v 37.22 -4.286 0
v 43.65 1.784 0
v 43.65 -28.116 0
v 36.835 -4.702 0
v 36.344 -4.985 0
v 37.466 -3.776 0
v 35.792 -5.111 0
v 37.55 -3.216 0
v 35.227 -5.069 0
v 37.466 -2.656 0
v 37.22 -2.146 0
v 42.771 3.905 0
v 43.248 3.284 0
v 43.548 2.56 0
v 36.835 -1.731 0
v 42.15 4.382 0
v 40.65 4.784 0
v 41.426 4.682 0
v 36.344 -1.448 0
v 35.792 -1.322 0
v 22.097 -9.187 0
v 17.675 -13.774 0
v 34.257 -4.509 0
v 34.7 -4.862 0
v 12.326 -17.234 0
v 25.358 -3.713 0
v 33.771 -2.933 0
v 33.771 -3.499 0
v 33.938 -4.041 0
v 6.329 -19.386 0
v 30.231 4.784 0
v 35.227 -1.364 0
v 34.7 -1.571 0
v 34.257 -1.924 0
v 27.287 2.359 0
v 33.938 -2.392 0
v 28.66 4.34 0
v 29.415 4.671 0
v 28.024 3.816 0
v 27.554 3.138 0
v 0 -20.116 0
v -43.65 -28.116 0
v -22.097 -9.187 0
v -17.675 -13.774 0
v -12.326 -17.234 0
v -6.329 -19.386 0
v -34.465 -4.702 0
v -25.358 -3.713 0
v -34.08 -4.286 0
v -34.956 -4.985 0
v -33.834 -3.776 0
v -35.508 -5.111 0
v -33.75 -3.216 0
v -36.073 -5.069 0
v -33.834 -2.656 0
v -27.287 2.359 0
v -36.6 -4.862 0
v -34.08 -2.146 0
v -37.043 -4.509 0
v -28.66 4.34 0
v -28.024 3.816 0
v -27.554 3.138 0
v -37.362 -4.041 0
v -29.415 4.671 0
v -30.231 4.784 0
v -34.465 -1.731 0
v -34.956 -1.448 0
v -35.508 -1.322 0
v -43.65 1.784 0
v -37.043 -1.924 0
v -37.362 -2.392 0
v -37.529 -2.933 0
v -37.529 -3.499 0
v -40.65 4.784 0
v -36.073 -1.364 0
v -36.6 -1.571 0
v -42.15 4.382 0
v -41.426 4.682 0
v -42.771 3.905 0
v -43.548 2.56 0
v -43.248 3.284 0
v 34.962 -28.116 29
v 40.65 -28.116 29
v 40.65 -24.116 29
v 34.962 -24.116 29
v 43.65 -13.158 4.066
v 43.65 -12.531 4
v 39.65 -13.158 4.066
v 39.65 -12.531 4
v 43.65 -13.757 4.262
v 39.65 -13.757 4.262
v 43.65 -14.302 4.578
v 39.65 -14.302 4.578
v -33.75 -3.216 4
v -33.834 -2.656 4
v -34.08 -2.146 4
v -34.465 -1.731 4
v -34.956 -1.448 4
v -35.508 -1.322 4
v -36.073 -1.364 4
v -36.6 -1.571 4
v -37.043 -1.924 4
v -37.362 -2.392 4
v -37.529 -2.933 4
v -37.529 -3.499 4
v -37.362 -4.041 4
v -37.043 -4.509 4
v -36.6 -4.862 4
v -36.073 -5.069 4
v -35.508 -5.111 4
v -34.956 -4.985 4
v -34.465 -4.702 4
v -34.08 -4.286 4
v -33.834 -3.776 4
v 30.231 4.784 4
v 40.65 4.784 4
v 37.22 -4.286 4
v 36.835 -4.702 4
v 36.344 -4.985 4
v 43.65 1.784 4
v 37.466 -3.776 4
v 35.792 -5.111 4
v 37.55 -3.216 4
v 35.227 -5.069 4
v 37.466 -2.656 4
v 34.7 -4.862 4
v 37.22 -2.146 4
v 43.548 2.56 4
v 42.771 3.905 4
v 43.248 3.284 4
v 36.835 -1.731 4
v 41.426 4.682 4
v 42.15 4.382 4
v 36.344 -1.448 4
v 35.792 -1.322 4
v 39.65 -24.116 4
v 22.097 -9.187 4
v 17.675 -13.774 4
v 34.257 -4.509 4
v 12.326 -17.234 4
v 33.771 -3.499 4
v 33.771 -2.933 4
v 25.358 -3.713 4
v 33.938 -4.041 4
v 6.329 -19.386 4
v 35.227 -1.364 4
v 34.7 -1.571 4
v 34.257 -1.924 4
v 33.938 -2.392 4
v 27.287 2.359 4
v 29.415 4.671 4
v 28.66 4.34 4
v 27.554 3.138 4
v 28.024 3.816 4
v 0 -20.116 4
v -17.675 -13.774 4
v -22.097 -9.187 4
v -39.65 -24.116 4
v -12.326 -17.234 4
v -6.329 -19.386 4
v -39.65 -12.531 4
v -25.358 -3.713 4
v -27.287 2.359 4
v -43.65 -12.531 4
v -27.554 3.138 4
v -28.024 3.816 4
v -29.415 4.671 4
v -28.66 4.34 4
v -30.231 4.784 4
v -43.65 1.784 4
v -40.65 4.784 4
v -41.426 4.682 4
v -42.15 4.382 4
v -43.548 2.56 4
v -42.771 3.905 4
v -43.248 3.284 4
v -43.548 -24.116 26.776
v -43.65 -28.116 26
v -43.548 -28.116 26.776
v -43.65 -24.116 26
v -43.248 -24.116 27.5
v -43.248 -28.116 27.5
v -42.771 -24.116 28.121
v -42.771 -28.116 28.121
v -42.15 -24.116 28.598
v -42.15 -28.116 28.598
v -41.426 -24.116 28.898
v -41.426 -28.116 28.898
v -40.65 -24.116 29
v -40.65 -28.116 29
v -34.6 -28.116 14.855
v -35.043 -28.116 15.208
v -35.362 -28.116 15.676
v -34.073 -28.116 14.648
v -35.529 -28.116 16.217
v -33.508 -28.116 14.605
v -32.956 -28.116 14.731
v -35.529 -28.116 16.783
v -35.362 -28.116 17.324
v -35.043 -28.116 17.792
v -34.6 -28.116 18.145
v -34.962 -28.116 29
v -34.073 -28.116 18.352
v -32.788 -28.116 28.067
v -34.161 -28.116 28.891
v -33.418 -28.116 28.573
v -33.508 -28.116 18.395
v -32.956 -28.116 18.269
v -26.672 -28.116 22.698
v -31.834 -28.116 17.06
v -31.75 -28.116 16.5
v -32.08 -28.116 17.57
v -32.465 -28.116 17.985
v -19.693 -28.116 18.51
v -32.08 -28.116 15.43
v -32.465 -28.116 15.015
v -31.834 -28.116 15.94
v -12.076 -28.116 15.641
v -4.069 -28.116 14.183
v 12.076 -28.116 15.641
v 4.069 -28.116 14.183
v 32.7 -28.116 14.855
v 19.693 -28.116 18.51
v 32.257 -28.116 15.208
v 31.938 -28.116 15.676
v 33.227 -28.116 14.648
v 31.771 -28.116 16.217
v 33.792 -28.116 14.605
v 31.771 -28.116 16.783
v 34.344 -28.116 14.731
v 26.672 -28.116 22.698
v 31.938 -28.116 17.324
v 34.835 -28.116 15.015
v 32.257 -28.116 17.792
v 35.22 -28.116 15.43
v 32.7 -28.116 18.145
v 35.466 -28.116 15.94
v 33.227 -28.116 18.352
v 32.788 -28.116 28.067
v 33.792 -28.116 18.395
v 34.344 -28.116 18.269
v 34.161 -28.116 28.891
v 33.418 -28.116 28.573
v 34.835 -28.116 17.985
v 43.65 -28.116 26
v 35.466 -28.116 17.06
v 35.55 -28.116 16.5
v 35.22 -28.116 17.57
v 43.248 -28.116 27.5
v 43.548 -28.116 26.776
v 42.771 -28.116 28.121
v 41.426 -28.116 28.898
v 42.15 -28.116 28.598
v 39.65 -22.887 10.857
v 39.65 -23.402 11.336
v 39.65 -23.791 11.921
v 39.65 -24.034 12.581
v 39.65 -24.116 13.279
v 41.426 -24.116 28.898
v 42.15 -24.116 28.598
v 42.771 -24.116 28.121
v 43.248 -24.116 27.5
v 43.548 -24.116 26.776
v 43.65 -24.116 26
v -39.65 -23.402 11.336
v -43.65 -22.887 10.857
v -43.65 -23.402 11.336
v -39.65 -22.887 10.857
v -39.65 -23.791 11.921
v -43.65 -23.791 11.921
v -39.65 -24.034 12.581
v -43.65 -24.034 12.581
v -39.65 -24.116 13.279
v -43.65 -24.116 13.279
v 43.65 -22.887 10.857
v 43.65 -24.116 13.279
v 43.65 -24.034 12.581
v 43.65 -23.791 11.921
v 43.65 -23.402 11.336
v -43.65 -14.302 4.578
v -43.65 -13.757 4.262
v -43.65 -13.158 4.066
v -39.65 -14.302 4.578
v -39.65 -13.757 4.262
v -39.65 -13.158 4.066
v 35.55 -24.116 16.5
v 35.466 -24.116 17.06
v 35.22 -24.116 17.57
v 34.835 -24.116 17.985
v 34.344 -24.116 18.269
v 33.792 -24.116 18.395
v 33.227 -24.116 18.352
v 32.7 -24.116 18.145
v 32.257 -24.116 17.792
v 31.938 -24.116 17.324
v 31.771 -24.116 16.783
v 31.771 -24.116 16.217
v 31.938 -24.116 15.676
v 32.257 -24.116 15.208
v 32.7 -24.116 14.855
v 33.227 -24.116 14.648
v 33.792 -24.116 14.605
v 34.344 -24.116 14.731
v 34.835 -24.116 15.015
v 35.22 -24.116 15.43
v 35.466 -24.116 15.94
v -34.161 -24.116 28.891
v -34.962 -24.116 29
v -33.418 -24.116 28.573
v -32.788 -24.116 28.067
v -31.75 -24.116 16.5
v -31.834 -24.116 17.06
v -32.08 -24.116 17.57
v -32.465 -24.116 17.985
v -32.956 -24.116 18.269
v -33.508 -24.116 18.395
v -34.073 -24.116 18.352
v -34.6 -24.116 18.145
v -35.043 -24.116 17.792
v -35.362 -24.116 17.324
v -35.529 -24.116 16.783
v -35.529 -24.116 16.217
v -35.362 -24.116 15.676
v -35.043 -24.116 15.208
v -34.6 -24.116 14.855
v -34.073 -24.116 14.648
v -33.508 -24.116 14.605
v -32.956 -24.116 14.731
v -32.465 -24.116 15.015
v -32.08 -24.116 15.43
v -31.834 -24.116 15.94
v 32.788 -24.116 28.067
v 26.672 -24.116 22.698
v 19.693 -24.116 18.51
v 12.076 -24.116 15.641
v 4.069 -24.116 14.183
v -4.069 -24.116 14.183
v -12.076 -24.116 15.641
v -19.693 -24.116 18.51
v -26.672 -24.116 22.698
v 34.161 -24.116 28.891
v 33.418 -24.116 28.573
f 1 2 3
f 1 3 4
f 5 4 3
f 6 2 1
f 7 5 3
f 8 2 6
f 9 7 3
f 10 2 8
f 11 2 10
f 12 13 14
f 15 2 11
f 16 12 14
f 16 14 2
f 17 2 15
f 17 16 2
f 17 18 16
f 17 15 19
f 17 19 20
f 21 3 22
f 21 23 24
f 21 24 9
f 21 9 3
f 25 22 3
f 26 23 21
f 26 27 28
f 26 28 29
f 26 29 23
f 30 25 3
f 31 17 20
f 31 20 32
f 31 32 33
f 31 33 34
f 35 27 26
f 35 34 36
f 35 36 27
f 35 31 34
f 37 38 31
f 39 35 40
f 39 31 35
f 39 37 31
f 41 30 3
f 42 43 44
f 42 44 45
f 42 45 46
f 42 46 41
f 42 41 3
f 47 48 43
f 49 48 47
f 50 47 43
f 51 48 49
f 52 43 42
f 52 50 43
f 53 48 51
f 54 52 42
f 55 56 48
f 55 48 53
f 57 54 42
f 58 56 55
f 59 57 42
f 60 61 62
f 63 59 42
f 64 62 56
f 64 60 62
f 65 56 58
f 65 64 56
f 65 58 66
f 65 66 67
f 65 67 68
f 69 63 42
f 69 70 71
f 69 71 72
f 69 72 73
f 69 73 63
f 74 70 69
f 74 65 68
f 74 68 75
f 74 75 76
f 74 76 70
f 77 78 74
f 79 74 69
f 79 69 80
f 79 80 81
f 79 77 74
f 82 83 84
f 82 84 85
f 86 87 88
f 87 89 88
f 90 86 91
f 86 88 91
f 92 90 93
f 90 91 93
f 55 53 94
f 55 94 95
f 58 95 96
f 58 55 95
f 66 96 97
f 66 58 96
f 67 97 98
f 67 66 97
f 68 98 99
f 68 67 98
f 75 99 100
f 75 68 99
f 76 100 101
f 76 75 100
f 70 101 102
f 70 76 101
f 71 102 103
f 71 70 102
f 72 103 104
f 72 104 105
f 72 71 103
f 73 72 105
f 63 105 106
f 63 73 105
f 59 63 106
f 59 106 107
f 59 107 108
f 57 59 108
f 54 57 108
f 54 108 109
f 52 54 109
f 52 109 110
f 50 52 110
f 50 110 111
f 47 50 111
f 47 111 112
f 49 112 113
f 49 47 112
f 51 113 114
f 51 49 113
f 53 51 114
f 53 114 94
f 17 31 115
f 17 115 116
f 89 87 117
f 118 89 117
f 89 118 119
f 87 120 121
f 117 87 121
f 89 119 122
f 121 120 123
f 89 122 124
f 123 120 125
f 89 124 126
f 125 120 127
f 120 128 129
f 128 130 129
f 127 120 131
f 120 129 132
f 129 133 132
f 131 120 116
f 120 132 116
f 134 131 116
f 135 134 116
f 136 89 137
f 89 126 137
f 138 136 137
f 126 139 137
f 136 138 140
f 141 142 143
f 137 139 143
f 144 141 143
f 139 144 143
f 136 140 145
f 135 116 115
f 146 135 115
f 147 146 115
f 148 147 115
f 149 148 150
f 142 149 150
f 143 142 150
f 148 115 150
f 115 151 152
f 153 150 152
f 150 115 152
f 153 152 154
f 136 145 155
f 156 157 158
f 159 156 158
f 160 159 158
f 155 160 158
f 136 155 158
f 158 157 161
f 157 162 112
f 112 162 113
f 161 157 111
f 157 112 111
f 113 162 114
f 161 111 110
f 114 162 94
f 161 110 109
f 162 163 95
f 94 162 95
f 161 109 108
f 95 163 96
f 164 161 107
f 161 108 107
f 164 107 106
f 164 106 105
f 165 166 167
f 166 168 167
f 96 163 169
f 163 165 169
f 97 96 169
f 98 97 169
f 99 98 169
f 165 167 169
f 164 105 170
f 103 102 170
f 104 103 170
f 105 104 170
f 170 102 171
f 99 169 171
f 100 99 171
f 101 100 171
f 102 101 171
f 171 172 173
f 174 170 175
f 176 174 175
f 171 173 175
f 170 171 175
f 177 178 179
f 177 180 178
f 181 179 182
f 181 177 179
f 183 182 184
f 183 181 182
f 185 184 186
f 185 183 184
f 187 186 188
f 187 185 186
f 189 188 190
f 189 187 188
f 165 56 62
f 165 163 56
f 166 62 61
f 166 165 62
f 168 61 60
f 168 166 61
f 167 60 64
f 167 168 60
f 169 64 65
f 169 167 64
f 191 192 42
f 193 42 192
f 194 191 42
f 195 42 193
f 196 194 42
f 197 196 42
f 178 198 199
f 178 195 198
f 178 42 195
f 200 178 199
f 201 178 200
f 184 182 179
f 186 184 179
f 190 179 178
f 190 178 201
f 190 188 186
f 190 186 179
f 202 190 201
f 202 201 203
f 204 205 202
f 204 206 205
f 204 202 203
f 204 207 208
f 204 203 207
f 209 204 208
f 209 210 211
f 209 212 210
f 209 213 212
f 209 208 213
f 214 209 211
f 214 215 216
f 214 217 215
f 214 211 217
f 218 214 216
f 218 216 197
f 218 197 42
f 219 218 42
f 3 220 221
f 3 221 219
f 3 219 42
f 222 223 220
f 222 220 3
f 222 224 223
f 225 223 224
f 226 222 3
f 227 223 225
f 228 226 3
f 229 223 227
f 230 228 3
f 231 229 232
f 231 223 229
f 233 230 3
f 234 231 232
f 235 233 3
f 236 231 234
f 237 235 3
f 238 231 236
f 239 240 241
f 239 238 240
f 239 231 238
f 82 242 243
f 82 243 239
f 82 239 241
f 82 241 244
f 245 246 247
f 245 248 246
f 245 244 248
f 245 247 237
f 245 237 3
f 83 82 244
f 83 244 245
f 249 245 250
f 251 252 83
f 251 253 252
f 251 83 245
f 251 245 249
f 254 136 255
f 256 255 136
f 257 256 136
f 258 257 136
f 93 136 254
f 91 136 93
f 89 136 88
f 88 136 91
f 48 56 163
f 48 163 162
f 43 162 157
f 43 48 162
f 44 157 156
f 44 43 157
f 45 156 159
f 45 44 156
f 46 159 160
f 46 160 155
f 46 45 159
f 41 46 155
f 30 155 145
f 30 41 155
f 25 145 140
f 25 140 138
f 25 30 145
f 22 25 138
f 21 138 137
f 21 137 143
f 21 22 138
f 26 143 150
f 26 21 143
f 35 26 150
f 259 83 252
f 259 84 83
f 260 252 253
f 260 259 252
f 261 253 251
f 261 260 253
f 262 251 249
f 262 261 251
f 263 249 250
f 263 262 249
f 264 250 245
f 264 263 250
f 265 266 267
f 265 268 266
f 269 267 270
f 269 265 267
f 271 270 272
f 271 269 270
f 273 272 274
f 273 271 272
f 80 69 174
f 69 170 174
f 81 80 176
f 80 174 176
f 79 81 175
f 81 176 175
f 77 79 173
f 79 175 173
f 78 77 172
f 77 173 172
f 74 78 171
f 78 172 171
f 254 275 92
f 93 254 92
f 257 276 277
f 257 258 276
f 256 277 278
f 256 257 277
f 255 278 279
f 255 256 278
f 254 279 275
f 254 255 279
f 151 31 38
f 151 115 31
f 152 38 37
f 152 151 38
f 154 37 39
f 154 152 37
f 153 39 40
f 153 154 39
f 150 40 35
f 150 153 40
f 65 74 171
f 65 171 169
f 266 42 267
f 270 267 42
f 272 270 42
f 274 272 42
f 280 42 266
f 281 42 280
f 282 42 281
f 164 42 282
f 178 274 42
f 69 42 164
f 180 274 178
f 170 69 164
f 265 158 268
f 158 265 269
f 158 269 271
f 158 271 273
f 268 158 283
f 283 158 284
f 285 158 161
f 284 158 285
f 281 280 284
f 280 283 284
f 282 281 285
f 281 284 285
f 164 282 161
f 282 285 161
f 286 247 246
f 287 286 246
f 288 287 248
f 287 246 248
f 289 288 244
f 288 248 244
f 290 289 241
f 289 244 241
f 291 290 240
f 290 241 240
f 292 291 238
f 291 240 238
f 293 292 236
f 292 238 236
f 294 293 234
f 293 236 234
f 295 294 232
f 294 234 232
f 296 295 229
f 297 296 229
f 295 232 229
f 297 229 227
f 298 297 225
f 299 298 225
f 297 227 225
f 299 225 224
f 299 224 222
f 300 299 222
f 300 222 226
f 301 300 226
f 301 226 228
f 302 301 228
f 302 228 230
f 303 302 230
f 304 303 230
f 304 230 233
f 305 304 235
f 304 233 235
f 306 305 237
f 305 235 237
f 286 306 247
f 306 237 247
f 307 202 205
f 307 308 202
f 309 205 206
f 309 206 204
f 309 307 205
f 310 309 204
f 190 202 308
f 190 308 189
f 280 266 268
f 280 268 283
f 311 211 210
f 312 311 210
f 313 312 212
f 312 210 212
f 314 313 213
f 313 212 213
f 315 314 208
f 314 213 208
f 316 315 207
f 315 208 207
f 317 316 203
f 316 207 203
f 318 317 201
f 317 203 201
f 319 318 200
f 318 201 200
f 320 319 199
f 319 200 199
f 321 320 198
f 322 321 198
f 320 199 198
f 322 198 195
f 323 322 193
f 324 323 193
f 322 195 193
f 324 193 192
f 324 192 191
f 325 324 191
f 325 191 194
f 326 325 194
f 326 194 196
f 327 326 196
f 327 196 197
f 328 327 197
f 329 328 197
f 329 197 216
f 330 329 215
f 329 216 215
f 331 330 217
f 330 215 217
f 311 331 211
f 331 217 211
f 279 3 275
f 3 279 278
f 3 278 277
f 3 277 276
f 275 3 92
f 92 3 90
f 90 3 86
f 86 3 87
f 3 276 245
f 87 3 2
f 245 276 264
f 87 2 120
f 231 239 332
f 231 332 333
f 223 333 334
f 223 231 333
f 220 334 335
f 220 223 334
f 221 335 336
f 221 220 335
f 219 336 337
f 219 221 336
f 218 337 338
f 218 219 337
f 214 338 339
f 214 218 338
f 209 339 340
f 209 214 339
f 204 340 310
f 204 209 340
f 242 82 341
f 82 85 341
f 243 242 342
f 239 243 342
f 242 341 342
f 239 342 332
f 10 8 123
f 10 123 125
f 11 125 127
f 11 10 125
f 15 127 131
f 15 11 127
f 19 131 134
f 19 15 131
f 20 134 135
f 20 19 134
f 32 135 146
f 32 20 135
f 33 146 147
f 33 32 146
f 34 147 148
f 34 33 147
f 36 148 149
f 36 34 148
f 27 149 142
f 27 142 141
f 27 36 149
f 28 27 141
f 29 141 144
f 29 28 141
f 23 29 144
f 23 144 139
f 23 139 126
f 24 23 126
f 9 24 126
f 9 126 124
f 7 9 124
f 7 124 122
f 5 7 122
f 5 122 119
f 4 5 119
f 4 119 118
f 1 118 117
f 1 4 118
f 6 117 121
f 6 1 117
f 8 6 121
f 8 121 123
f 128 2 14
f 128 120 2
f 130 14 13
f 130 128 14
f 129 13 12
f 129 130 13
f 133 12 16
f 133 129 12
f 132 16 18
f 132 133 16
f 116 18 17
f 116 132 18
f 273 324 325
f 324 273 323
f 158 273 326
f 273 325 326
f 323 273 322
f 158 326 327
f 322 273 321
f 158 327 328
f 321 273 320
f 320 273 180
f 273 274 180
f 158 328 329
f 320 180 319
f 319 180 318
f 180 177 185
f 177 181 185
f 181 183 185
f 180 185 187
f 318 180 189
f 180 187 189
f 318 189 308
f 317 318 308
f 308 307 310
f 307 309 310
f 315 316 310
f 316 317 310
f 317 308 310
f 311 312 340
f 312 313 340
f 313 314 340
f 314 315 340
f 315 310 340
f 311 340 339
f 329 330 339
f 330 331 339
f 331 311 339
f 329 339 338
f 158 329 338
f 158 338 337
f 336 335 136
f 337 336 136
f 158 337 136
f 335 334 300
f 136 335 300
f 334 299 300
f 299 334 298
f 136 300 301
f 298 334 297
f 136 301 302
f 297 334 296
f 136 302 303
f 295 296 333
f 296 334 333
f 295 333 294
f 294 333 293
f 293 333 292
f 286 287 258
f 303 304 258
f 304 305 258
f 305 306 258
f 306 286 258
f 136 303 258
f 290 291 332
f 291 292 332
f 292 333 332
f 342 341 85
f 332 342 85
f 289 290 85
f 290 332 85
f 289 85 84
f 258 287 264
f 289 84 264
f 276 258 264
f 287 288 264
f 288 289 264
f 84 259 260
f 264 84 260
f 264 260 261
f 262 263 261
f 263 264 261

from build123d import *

# Parameters (mm, degrees)
SKETCH1_R      = 1.9
EXTRUDE1_DEPTH = 4
SKETCH2_R      = 1.9
EXTRUDE2_DEPTH = 4
EXTRUDE3_DEPTH = 4
FILLET1_R      = 3


with BuildPart() as part:
    # Sketch1 → Extrude1 (new body)
    with BuildSketch(Plane.XY):
        with BuildLine():
            Line((-43.65, 4.783810266), (-27.65, 4.783810266))
            ThreePointArc((-27.65, 4.783810266), (0, -20.116189734), (27.65, 4.783810266))
            Line((27.65, 4.783810266), (43.65, 4.783810266))
            Line((43.65, 4.783810266), (43.65, -28.116189734))
            Line((43.65, -28.116189734), (-43.65, -28.116189734))
            Line((-43.65, -28.116189734), (-43.65, 4.783810266))
        make_face()
        with Locations((-35.65, -3.216189734)):
            Circle(SKETCH1_R, mode=Mode.SUBTRACT)
        with Locations((35.65, -3.216189734)):
            Circle(SKETCH1_R, mode=Mode.SUBTRACT)
    extrude(amount=EXTRUDE1_DEPTH)



with BuildPart() as body_2:
    # Sketch2 → Extrude2 (new body)
    with BuildSketch(Plane.XZ.offset(28.116189734)):
        with BuildLine():
            Line((-33.65, 29), (-43.65, 29))
            Line((-43.65, 29), (-43.65, 4))
            Line((-43.65, 4), (43.65, 4))
            Line((43.65, 4), (43.65, 29))
            Line((43.65, 29), (33.65, 29))
            ThreePointArc((33.65, 29), (0, 14), (-33.65, 29))
        make_face()
        with Locations((-33.65, 16.5)):
            Circle(SKETCH2_R, mode=Mode.SUBTRACT)
        with Locations((33.65, 16.5)):
            Circle(SKETCH2_R, mode=Mode.SUBTRACT)
    extrude(amount=-EXTRUDE2_DEPTH)


with BuildPart() as part_1:
    add(part.part)

    add(body_2.part)  # Extrude3 merges body 2
    # Sketch3 → Extrude3 (add)
    with BuildSketch(Plane(origin=(43.65, 0, 0), x_dir=(0, 0, -1), z_dir=(1, 0, 0))):
        Polygon((-4, -24.116189734), (-11.756042517, -24.116189734), (-4, -13.510964822), align=None)
    extrude3 = extrude(amount=-EXTRUDE3_DEPTH)

    # Mirror1: Extrude3 across plane
    add(extrude3.mirror(Plane(origin=(0, 0, 0), x_dir=(0, 0, 1), z_dir=(1, 0, 0))))

    # Fillet1
    fillet1_edges = [part_1.edges().sort_by_distance(p)[0] for p in [
        (-43.65, 4.783810266, 2),
        (-27.65, 4.783810266, 2),
        (27.65, 4.783810266, 2),
        (43.65, 4.783810266, 2),
        (41.65, -13.510964822, 4),
        (41.65, -24.116189734, 11.756042517),
        (-33.65, -26.116189734, 29),
        (33.65, -26.116189734, 29),
        (43.65, -26.116189734, 29),
        (-43.65, -26.116189734, 29),
        (-41.65, -13.510964822, 4),
        (-41.65, -24.116189734, 11.756042517),
    ]]
    fillet(fillet1_edges, radius=FILLET1_R)


solid = part_1.part
